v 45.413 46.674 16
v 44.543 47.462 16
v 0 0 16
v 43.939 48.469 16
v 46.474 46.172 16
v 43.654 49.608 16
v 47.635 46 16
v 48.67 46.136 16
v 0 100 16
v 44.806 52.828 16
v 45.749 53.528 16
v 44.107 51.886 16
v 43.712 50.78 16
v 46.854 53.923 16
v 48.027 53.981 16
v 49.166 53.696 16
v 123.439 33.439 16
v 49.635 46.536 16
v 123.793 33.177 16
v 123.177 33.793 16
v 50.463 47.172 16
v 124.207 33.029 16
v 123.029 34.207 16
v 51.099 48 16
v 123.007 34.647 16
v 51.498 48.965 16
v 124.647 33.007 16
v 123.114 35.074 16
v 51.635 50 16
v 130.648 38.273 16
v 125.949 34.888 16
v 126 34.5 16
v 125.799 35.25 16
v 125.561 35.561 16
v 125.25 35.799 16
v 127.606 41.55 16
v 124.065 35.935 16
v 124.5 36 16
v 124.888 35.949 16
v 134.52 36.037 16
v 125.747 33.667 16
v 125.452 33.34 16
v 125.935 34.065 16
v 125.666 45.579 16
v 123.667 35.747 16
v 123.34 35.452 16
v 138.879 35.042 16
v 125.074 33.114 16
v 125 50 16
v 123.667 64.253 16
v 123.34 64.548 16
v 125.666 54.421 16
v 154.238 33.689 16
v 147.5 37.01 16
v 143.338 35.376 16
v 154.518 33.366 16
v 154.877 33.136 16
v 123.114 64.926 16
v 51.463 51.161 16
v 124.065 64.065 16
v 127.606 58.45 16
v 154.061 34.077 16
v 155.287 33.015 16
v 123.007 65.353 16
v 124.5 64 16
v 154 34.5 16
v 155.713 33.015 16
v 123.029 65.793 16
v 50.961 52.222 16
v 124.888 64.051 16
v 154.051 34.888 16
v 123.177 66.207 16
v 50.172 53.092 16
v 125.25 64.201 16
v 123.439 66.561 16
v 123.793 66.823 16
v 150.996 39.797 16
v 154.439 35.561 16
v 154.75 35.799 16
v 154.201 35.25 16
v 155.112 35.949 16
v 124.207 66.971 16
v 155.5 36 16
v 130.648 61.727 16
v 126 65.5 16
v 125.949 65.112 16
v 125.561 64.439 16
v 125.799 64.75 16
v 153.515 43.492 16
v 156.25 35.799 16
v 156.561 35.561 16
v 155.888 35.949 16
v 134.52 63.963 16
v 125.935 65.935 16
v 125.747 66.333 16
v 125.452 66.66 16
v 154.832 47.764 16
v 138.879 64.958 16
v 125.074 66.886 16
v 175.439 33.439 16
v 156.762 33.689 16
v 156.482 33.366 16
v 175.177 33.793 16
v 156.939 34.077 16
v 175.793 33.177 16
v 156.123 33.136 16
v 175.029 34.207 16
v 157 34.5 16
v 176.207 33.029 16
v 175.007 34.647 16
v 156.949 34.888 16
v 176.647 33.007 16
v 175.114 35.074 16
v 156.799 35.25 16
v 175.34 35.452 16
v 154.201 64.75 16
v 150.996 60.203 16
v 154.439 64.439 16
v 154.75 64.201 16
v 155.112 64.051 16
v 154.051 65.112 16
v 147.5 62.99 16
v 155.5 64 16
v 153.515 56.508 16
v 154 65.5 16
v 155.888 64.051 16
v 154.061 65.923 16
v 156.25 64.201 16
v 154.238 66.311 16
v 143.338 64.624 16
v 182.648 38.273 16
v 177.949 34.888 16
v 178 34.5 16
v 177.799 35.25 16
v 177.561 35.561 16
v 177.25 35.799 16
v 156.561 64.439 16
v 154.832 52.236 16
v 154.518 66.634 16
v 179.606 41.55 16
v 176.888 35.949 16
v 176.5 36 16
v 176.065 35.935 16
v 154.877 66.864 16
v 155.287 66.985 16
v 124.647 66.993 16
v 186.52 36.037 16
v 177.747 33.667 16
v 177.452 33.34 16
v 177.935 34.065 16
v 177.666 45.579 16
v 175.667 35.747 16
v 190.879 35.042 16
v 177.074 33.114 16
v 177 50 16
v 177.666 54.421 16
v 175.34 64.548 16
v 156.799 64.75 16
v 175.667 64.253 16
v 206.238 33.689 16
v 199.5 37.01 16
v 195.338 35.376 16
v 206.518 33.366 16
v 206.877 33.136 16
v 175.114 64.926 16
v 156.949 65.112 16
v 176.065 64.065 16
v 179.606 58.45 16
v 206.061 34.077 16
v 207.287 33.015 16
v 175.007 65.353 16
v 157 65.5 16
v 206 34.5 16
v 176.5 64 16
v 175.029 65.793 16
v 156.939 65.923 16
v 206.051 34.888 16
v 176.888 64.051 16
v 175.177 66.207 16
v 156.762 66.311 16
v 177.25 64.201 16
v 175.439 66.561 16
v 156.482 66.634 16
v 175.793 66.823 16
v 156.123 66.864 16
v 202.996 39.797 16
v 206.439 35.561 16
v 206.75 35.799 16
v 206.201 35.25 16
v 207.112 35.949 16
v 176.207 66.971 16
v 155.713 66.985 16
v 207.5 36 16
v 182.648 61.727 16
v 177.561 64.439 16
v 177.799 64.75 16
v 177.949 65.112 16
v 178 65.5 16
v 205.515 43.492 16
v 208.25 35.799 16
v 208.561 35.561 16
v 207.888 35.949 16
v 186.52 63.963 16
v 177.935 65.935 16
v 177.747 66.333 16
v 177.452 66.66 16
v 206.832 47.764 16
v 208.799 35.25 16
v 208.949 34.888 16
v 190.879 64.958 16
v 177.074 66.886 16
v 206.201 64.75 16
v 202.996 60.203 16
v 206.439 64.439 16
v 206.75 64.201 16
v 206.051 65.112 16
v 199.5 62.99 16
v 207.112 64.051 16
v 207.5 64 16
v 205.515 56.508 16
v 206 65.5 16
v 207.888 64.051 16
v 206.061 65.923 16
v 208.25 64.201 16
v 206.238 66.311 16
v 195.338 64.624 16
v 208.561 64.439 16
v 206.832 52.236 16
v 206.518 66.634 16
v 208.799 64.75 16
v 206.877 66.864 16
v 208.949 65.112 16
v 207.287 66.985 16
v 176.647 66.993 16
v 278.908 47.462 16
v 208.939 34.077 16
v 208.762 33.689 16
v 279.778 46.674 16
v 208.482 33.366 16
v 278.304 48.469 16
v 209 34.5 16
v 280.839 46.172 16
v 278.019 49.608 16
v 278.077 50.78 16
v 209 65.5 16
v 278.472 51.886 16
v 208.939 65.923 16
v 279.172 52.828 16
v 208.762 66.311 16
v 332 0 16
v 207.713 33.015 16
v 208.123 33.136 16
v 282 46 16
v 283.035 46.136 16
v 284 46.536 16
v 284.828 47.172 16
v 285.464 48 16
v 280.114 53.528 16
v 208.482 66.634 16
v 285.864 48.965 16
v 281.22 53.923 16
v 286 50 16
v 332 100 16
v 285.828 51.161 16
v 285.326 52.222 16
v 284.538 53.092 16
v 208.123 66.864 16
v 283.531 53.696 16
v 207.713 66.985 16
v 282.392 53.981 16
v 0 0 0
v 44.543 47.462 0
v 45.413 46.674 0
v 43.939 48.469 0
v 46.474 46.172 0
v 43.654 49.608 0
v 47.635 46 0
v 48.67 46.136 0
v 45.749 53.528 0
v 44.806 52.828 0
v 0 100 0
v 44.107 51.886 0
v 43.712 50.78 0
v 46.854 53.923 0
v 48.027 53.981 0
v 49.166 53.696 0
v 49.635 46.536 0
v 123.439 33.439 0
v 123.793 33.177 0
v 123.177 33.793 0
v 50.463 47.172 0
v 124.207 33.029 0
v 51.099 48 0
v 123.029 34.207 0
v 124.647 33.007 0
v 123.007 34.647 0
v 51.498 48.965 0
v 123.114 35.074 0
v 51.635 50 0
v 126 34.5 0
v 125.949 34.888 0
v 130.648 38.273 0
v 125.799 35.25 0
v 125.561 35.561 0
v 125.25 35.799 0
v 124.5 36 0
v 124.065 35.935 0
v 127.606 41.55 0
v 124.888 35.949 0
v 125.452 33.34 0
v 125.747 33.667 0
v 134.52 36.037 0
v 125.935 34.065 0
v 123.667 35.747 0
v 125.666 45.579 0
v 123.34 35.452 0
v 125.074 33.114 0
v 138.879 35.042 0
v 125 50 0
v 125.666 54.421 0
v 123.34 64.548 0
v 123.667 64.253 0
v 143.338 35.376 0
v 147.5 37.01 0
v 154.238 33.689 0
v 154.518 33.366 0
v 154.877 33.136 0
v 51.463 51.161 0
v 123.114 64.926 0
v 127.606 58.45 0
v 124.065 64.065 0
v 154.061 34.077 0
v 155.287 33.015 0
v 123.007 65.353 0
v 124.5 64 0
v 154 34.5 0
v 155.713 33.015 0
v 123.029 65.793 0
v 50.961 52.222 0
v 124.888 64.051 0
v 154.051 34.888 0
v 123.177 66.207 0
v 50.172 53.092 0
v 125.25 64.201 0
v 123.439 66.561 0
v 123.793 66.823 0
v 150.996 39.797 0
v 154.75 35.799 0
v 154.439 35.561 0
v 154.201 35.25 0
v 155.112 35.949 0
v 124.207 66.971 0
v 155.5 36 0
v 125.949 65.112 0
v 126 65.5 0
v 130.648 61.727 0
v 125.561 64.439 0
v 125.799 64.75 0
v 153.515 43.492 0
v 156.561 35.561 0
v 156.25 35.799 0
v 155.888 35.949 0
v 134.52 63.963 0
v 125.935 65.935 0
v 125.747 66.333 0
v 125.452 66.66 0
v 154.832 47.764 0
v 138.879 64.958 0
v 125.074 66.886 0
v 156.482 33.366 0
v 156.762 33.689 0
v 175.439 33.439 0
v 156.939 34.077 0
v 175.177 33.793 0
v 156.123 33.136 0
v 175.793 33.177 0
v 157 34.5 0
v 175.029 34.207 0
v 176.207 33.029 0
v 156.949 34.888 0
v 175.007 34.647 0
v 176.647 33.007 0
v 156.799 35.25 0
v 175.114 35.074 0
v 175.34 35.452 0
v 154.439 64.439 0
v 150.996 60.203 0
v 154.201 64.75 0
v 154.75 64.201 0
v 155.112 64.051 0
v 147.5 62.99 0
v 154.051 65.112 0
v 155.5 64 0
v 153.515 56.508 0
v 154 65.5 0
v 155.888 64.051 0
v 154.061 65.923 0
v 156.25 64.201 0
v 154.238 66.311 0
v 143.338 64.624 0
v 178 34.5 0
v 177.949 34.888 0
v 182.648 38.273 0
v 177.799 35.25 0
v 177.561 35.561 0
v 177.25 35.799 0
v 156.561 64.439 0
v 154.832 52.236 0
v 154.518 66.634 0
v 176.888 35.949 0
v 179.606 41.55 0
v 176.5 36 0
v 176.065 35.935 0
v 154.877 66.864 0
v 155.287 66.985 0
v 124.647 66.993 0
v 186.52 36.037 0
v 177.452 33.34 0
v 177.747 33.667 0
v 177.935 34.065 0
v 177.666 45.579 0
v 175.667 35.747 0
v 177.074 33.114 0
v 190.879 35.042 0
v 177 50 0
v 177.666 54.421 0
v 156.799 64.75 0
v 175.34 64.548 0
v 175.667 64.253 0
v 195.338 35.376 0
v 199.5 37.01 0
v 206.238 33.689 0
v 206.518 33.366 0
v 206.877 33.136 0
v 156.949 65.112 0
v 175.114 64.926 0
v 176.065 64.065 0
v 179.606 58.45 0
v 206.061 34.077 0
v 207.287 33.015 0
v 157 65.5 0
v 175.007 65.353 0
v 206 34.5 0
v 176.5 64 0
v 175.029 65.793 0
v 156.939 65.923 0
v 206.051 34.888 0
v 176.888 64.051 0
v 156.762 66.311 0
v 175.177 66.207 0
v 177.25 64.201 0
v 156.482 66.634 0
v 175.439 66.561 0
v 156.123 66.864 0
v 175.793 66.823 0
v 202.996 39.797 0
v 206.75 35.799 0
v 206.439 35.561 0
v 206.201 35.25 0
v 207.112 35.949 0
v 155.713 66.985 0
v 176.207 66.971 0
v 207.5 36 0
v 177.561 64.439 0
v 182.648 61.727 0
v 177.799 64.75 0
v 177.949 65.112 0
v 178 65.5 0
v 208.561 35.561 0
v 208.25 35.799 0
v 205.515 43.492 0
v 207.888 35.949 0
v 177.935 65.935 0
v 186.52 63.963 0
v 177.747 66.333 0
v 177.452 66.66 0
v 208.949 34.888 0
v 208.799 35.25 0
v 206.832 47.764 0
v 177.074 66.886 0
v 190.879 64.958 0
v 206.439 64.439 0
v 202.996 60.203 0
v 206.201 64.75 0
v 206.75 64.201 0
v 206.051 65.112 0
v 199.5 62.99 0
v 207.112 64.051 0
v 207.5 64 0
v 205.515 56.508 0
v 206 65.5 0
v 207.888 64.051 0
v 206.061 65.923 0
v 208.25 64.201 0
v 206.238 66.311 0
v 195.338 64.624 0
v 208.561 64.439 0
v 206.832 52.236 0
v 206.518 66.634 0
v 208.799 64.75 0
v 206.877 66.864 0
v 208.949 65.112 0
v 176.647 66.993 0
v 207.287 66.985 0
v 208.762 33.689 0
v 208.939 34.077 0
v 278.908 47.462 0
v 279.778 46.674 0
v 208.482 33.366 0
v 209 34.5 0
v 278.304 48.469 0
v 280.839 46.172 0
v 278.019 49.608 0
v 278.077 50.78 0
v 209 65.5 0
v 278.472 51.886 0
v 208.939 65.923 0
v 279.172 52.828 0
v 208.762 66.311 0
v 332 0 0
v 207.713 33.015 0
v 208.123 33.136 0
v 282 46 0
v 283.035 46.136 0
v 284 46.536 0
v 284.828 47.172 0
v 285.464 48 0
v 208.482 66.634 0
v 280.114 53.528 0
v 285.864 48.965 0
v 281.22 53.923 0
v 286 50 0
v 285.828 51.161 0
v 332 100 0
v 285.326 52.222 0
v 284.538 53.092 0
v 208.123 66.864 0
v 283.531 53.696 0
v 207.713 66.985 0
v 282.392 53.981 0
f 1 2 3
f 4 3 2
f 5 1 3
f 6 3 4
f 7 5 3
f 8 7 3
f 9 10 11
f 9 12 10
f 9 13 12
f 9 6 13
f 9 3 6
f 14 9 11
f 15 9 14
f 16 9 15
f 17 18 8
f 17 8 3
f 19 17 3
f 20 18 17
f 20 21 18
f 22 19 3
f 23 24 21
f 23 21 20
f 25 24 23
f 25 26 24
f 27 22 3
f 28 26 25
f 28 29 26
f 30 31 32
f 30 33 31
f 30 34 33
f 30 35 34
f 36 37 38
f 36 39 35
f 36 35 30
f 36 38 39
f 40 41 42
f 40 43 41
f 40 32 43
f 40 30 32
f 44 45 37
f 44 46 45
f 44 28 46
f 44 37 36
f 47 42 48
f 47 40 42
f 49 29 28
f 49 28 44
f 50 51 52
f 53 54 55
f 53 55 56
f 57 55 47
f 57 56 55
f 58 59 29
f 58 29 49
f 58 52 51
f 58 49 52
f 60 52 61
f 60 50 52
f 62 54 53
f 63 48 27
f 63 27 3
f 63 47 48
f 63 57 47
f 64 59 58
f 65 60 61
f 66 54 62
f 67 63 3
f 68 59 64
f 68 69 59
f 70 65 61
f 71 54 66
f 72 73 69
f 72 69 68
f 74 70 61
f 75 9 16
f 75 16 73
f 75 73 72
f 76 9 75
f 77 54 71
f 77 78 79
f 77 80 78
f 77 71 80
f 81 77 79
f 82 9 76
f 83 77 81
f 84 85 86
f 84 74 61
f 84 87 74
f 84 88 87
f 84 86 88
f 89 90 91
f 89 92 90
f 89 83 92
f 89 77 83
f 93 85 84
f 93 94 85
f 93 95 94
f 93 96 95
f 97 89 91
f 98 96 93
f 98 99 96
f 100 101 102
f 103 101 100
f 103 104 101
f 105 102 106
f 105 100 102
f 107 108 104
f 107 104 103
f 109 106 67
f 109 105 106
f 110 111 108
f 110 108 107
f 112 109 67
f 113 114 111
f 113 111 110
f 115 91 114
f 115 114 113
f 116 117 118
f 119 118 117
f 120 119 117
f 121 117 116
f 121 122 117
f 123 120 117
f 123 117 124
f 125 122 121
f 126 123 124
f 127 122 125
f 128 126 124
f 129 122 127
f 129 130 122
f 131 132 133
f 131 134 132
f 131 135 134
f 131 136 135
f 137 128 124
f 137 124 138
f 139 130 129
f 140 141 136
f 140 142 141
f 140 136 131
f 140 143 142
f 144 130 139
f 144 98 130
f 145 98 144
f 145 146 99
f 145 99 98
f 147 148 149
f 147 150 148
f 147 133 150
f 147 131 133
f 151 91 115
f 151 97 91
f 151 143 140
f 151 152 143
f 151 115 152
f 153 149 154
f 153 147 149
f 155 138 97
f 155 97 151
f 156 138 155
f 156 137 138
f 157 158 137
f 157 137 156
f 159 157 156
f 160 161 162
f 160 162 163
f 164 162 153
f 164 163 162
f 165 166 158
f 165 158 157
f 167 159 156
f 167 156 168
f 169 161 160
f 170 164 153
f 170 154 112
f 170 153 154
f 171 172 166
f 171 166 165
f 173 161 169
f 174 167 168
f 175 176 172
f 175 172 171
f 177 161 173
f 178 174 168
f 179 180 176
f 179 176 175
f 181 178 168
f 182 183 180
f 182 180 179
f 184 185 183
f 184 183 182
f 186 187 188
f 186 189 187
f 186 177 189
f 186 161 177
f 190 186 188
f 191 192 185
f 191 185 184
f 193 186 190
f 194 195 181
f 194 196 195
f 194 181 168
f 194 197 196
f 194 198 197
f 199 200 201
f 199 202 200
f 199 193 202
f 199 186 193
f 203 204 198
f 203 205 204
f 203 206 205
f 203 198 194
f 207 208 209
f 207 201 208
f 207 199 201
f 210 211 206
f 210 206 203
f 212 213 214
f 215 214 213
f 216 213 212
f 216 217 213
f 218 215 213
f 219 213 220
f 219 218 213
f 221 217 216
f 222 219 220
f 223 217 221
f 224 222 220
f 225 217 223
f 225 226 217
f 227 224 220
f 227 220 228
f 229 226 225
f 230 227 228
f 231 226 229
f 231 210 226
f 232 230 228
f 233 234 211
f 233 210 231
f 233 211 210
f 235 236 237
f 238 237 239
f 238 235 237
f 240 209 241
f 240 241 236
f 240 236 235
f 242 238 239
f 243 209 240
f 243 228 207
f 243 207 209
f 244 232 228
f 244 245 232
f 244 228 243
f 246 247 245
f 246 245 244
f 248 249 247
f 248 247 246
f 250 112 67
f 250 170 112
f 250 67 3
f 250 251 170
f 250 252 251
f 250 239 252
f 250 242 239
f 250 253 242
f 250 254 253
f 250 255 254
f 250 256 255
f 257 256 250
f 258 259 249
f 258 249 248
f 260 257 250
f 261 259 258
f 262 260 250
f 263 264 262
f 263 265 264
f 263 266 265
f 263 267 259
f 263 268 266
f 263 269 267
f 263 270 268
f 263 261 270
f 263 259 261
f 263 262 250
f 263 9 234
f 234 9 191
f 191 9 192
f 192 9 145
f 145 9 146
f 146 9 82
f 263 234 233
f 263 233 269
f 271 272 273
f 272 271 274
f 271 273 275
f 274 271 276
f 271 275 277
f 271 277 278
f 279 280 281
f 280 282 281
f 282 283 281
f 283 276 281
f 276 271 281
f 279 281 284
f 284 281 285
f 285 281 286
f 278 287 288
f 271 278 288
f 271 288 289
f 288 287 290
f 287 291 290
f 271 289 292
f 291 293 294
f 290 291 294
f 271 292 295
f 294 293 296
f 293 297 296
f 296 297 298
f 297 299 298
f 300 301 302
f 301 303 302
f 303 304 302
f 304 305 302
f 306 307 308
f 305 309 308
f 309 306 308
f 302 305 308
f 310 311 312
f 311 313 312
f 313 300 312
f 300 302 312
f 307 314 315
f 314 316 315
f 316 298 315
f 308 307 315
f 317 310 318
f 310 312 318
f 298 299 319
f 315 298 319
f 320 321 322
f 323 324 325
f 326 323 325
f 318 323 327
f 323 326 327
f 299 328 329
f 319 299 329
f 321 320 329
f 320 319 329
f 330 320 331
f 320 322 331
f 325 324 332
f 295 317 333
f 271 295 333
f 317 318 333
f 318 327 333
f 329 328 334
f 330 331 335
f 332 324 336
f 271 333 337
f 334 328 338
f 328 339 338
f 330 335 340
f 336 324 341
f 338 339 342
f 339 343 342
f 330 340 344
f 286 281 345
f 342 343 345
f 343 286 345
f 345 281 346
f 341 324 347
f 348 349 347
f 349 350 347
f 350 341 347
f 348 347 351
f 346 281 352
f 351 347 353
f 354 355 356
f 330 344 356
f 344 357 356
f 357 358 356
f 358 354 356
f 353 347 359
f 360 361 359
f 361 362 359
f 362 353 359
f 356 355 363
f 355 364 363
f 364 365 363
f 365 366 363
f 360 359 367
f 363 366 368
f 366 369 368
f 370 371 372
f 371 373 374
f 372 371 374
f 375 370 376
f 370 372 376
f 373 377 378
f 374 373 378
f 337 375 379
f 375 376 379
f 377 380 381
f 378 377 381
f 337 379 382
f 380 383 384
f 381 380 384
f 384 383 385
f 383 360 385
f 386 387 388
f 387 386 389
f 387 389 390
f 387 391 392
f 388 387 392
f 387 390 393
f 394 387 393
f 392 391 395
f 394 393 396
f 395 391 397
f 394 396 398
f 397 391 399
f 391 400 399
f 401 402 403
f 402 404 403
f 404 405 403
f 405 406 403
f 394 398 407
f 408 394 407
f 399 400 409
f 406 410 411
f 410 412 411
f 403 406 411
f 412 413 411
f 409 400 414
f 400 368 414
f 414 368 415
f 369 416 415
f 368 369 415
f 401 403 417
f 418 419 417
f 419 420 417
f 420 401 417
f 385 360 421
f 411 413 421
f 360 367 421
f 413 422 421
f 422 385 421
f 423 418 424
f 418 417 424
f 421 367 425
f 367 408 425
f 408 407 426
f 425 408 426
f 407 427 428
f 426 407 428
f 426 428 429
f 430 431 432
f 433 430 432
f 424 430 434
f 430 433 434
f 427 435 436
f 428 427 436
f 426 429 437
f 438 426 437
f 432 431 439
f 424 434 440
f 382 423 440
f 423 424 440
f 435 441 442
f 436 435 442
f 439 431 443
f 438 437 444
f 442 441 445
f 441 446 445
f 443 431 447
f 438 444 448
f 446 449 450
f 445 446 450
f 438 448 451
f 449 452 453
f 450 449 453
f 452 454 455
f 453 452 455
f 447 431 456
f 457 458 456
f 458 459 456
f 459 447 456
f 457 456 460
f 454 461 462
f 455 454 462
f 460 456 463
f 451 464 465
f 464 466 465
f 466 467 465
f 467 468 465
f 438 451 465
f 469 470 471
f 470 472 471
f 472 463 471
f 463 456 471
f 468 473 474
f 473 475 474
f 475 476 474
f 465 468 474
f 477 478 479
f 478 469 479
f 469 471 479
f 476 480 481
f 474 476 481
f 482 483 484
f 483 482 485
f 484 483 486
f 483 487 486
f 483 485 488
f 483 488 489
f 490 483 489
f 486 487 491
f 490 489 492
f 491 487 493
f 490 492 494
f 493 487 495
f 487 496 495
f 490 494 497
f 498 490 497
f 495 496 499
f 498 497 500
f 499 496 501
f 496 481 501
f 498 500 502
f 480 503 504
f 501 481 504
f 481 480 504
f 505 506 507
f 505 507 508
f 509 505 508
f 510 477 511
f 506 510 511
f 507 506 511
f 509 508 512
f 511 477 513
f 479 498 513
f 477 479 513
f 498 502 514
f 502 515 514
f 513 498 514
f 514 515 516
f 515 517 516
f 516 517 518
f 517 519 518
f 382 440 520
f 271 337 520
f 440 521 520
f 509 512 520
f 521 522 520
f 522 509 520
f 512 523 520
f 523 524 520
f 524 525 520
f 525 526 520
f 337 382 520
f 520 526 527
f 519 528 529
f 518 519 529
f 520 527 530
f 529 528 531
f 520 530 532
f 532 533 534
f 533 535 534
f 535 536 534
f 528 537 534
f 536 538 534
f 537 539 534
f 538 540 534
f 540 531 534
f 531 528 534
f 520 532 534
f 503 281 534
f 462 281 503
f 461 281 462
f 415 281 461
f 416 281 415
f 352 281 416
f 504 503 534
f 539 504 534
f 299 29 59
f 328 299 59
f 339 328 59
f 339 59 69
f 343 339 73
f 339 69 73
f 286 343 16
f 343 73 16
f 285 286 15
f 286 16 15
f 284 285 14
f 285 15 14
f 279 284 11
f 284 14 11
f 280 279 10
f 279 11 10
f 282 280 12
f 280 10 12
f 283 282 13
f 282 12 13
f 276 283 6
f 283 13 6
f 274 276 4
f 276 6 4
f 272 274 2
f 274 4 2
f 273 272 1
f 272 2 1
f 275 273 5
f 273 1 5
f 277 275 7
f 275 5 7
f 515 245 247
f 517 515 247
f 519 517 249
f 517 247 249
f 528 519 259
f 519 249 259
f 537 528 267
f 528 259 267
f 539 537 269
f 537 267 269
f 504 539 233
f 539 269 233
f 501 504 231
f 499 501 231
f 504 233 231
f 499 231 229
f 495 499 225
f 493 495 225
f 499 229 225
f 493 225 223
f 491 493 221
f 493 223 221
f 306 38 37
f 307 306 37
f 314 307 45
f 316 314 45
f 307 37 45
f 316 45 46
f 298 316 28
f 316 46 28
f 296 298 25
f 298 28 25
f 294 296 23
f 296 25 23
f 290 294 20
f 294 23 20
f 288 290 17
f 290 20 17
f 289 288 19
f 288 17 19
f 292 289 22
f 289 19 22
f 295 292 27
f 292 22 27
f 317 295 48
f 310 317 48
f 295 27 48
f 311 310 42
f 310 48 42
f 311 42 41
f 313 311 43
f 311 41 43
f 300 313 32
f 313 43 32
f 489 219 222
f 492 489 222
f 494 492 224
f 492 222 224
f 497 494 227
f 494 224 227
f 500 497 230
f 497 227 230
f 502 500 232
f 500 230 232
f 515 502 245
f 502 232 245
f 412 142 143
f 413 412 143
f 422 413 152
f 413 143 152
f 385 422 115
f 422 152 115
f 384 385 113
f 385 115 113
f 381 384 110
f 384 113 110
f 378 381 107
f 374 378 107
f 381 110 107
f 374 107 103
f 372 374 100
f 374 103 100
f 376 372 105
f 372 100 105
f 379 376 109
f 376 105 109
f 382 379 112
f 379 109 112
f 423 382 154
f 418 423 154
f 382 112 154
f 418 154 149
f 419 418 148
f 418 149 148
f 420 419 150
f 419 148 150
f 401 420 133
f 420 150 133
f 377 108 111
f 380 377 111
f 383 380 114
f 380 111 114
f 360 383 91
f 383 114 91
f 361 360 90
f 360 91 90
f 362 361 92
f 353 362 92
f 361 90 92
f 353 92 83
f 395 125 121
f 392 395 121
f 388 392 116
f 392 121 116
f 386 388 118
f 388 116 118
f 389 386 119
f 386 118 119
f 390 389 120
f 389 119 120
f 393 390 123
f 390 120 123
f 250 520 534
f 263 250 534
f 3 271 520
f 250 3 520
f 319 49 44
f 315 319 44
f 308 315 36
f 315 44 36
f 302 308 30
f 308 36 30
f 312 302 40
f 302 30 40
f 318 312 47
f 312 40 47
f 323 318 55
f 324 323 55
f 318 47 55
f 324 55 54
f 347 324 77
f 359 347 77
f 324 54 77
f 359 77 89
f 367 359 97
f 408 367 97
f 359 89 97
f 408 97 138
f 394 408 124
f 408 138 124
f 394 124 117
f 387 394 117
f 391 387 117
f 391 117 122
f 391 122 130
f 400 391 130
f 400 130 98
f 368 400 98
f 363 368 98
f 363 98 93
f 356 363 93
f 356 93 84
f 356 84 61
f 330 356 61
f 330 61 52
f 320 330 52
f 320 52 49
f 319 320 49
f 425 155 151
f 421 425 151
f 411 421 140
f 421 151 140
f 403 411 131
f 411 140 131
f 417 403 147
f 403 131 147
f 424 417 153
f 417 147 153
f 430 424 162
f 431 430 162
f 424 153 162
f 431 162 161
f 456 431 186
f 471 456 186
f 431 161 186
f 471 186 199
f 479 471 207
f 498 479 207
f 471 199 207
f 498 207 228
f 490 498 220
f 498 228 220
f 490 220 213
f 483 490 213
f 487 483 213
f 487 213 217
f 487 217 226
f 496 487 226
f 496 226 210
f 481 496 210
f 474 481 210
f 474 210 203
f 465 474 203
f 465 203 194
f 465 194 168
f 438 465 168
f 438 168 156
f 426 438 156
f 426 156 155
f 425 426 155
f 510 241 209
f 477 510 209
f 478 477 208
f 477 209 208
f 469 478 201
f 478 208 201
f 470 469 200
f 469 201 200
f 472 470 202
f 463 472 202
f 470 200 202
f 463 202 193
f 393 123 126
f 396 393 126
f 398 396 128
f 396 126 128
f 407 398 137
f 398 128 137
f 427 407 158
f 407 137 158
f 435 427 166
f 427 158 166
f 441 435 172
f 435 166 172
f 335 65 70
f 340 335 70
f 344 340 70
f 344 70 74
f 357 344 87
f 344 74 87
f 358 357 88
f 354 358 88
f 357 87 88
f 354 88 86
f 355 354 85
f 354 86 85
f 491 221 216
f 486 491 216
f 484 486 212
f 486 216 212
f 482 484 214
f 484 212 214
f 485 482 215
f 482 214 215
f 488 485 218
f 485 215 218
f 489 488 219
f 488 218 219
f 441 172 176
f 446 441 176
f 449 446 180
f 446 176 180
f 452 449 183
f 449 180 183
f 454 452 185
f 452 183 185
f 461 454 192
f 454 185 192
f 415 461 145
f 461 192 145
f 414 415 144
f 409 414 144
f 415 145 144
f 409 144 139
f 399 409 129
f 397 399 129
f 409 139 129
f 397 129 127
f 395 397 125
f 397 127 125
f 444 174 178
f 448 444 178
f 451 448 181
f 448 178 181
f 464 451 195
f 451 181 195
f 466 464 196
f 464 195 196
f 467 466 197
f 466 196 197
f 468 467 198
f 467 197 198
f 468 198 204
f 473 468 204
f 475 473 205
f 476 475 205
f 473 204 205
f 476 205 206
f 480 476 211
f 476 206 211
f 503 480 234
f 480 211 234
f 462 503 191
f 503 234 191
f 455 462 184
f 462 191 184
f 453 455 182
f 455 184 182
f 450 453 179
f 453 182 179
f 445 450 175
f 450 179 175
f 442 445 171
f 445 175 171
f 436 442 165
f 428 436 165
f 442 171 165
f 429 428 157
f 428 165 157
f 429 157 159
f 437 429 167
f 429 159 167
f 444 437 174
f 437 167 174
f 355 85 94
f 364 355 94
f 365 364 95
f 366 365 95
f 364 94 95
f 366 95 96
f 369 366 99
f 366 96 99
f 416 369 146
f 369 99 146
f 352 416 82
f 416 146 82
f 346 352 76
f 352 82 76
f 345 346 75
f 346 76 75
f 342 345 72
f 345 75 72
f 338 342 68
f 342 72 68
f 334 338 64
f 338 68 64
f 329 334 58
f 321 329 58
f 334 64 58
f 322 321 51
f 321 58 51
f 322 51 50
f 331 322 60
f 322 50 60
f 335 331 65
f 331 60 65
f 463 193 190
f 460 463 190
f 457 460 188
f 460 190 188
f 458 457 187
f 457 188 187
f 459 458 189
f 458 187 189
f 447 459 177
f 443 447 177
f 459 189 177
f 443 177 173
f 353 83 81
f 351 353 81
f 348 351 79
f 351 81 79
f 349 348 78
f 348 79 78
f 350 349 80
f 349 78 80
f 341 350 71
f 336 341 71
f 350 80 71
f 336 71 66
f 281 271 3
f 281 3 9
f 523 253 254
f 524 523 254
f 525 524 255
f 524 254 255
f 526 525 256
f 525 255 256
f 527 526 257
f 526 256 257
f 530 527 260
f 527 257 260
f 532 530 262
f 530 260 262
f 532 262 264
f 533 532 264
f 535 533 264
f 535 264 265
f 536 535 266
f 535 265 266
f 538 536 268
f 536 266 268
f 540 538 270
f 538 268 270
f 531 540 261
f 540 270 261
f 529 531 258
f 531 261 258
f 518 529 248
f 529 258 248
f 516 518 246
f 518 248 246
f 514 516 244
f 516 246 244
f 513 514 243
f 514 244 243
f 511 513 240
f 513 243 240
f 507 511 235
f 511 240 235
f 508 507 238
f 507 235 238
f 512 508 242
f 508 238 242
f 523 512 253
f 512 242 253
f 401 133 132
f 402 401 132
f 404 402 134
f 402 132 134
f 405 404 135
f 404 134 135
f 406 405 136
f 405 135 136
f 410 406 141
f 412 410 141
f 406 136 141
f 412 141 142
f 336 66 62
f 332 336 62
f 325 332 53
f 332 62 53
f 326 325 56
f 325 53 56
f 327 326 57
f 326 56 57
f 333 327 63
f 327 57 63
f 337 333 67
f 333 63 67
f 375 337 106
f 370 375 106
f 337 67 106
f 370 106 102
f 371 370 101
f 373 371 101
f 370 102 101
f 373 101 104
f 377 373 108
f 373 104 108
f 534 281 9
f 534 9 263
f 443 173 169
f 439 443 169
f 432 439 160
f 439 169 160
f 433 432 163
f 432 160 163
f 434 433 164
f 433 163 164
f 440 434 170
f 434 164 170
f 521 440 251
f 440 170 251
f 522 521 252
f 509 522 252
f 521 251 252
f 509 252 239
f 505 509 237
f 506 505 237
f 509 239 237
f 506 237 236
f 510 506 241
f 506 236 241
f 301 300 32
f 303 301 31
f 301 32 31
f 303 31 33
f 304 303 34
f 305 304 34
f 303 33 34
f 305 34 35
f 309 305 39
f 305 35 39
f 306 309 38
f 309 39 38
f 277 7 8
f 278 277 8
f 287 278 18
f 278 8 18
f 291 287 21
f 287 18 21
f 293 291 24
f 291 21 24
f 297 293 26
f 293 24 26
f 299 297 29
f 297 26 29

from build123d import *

# Parameters (mm, degrees)
F0_W     = 332
F0_H     = 100
F1_DEPTH = 16
F3_DEPTH = 25
F5_DEPTH = 25


with BuildPart() as f1:
    # F0 (on Top) → F1 (new body)
    with BuildSketch(Plane.XY):
        with Locations((166, 50)):
            Rectangle(F0_W, F0_H)
    extrude(amount=F1_DEPTH)

    # F2 (on face) → F3 (cut)
    with BuildSketch(Plane.XY.offset(16)):
        with BuildLine():
            Line((125, 50), (140, 50))
            Line((140, 50), (155, 50))
            ThreePointArc((155, 50), (140, 65), (125, 50))
        make_face()
        with BuildLine():
            Line((140, 50), (140, 35))
            ThreePointArc((140, 35), (150.6066017178, 39.3933982822), (155, 50))
            Line((155, 50), (140, 50))
        make_face()
        with BuildLine():
            ThreePointArc((125, 50), (129.3933982822, 39.3933982822), (140, 35))
            Line((140, 35), (140, 50))
            Line((140, 50), (125, 50))
        make_face()
        with BuildLine():
            ThreePointArc((126, 65.5), (123.4393398282, 66.5606601718), (124.5, 64))
            Line((124.5, 64), (124.5, 65.5))
            Line((124.5, 65.5), (126, 65.5))
        make_face()
        with BuildLine():
            Line((124.5, 65.5), (124.5, 64))
            ThreePointArc((124.5, 64), (125.5606601718, 64.4393398282), (126, 65.5))
            Line((126, 65.5), (124.5, 65.5))
        make_face()
        with BuildLine():
            ThreePointArc((124.5, 36), (123.4393398282, 33.4393398282), (126, 34.5))
            Line((126, 34.5), (124.5, 34.5))
            Line((124.5, 34.5), (124.5, 36))
        make_face()
        with BuildLine():
            Line((124.5, 34.5), (126, 34.5))
            ThreePointArc((126, 34.5), (125.5606601718, 35.5606601718), (124.5, 36))
            Line((124.5, 36), (124.5, 34.5))
        make_face()
        with BuildLine():
            Line((155.5, 34.5), (154, 34.5))
            ThreePointArc((154, 34.5), (155.5, 33), (157, 34.5))
            ThreePointArc((157, 34.5), (156.5606601718, 35.5606601718), (155.5, 36))
            Line((155.5, 36), (155.5, 34.5))
        make_face()
        with BuildLine():
            ThreePointArc((155.5, 36), (154.4393398282, 35.5606601718), (154, 34.5))
            Line((154, 34.5), (155.5, 34.5))
            Line((155.5, 34.5), (155.5, 36))
        make_face()
        with BuildLine():
            Line((155.5, 65.5), (155.5, 64))
            ThreePointArc((155.5, 64), (156.5606601718, 64.4393398282), (157, 65.5))
            ThreePointArc((157, 65.5), (155.5, 67), (154, 65.5))
            Line((154, 65.5), (155.5, 65.5))
        make_face()
        with BuildLine():
            ThreePointArc((154, 65.5), (154.4393398282, 64.4393398282), (155.5, 64))
            Line((155.5, 64), (155.5, 65.5))
            Line((155.5, 65.5), (154, 65.5))
        make_face()
        with BuildLine():
            Line((192, 50), (192, 35))
            ThreePointArc((192, 35), (202.6066017178, 39.3933982822), (207, 50))
            Line((207, 50), (192, 50))
        make_face()
        with BuildLine():
            Line((177, 50), (192, 50))
            Line((192, 50), (207, 50))
            ThreePointArc((207, 50), (192, 65), (177, 50))
        make_face()
        with BuildLine():
            ThreePointArc((177, 50), (181.3933982822, 39.3933982822), (192, 35))
            Line((192, 35), (192, 50))
            Line((192, 50), (177, 50))
        make_face()
        with BuildLine():
            ThreePointArc((178, 65.5), (175.4393398282, 66.5606601718), (176.5, 64))
            Line((176.5, 64), (176.5, 65.5))
            Line((176.5, 65.5), (178, 65.5))
        make_face()
        with BuildLine():
            Line((176.5, 65.5), (176.5, 64))
            ThreePointArc((176.5, 64), (177.5606601718, 64.4393398282), (178, 65.5))
            Line((178, 65.5), (176.5, 65.5))
        make_face()
        with BuildLine():
            ThreePointArc((176.5, 36), (175.4393398282, 33.4393398282), (178, 34.5))
            Line((178, 34.5), (176.5, 34.5))
            Line((176.5, 34.5), (176.5, 36))
        make_face()
        with BuildLine():
            Line((176.5, 34.5), (178, 34.5))
            ThreePointArc((178, 34.5), (177.5606601718, 35.5606601718), (176.5, 36))
            Line((176.5, 36), (176.5, 34.5))
        make_face()
        with BuildLine():
            ThreePointArc((207.5, 36), (206.4393398282, 35.5606601718), (206, 34.5))
            Line((206, 34.5), (207.5, 34.5))
            Line((207.5, 34.5), (207.5, 36))
        make_face()
        with BuildLine():
            Line((207.5, 34.5), (206, 34.5))
            ThreePointArc((206, 34.5), (207.5, 33), (209, 34.5))
            ThreePointArc((209, 34.5), (208.5606601718, 35.5606601718), (207.5, 36))
            Line((207.5, 36), (207.5, 34.5))
        make_face()
        with BuildLine():
            Line((207.5, 65.5), (207.5, 64))
            ThreePointArc((207.5, 64), (208.5606601718, 64.4393398282), (209, 65.5))
            ThreePointArc((209, 65.5), (207.5, 67), (206, 65.5))
            Line((206, 65.5), (207.5, 65.5))
        make_face()
        with BuildLine():
            ThreePointArc((206, 65.5), (206.4393398282, 64.4393398282), (207.5, 64))
            Line((207.5, 64), (207.5, 65.5))
            Line((207.5, 65.5), (206, 65.5))
        make_face()
    extrude(amount=-F3_DEPTH, mode=Mode.SUBTRACT)

    # F4 (on face) → F5 (cut)
    with BuildSketch(Plane.XY.offset(16)):
        with BuildLine():
            ThreePointArc((51.6347899064, 50), (44.8063627817, 52.8284271247), (47.6347899064, 46))
            ThreePointArc((47.6347899064, 46), (50.4632170312, 47.1715728753), (51.6347899064, 50))
        make_face()
        with BuildLine():
            ThreePointArc((286, 50), (279.1715728753, 52.8284271247), (282, 46))
            ThreePointArc((282, 46), (284.8284271247, 47.1715728753), (286, 50))
        make_face()
    extrude(amount=-F5_DEPTH, mode=Mode.SUBTRACT)


solid = f1.part
